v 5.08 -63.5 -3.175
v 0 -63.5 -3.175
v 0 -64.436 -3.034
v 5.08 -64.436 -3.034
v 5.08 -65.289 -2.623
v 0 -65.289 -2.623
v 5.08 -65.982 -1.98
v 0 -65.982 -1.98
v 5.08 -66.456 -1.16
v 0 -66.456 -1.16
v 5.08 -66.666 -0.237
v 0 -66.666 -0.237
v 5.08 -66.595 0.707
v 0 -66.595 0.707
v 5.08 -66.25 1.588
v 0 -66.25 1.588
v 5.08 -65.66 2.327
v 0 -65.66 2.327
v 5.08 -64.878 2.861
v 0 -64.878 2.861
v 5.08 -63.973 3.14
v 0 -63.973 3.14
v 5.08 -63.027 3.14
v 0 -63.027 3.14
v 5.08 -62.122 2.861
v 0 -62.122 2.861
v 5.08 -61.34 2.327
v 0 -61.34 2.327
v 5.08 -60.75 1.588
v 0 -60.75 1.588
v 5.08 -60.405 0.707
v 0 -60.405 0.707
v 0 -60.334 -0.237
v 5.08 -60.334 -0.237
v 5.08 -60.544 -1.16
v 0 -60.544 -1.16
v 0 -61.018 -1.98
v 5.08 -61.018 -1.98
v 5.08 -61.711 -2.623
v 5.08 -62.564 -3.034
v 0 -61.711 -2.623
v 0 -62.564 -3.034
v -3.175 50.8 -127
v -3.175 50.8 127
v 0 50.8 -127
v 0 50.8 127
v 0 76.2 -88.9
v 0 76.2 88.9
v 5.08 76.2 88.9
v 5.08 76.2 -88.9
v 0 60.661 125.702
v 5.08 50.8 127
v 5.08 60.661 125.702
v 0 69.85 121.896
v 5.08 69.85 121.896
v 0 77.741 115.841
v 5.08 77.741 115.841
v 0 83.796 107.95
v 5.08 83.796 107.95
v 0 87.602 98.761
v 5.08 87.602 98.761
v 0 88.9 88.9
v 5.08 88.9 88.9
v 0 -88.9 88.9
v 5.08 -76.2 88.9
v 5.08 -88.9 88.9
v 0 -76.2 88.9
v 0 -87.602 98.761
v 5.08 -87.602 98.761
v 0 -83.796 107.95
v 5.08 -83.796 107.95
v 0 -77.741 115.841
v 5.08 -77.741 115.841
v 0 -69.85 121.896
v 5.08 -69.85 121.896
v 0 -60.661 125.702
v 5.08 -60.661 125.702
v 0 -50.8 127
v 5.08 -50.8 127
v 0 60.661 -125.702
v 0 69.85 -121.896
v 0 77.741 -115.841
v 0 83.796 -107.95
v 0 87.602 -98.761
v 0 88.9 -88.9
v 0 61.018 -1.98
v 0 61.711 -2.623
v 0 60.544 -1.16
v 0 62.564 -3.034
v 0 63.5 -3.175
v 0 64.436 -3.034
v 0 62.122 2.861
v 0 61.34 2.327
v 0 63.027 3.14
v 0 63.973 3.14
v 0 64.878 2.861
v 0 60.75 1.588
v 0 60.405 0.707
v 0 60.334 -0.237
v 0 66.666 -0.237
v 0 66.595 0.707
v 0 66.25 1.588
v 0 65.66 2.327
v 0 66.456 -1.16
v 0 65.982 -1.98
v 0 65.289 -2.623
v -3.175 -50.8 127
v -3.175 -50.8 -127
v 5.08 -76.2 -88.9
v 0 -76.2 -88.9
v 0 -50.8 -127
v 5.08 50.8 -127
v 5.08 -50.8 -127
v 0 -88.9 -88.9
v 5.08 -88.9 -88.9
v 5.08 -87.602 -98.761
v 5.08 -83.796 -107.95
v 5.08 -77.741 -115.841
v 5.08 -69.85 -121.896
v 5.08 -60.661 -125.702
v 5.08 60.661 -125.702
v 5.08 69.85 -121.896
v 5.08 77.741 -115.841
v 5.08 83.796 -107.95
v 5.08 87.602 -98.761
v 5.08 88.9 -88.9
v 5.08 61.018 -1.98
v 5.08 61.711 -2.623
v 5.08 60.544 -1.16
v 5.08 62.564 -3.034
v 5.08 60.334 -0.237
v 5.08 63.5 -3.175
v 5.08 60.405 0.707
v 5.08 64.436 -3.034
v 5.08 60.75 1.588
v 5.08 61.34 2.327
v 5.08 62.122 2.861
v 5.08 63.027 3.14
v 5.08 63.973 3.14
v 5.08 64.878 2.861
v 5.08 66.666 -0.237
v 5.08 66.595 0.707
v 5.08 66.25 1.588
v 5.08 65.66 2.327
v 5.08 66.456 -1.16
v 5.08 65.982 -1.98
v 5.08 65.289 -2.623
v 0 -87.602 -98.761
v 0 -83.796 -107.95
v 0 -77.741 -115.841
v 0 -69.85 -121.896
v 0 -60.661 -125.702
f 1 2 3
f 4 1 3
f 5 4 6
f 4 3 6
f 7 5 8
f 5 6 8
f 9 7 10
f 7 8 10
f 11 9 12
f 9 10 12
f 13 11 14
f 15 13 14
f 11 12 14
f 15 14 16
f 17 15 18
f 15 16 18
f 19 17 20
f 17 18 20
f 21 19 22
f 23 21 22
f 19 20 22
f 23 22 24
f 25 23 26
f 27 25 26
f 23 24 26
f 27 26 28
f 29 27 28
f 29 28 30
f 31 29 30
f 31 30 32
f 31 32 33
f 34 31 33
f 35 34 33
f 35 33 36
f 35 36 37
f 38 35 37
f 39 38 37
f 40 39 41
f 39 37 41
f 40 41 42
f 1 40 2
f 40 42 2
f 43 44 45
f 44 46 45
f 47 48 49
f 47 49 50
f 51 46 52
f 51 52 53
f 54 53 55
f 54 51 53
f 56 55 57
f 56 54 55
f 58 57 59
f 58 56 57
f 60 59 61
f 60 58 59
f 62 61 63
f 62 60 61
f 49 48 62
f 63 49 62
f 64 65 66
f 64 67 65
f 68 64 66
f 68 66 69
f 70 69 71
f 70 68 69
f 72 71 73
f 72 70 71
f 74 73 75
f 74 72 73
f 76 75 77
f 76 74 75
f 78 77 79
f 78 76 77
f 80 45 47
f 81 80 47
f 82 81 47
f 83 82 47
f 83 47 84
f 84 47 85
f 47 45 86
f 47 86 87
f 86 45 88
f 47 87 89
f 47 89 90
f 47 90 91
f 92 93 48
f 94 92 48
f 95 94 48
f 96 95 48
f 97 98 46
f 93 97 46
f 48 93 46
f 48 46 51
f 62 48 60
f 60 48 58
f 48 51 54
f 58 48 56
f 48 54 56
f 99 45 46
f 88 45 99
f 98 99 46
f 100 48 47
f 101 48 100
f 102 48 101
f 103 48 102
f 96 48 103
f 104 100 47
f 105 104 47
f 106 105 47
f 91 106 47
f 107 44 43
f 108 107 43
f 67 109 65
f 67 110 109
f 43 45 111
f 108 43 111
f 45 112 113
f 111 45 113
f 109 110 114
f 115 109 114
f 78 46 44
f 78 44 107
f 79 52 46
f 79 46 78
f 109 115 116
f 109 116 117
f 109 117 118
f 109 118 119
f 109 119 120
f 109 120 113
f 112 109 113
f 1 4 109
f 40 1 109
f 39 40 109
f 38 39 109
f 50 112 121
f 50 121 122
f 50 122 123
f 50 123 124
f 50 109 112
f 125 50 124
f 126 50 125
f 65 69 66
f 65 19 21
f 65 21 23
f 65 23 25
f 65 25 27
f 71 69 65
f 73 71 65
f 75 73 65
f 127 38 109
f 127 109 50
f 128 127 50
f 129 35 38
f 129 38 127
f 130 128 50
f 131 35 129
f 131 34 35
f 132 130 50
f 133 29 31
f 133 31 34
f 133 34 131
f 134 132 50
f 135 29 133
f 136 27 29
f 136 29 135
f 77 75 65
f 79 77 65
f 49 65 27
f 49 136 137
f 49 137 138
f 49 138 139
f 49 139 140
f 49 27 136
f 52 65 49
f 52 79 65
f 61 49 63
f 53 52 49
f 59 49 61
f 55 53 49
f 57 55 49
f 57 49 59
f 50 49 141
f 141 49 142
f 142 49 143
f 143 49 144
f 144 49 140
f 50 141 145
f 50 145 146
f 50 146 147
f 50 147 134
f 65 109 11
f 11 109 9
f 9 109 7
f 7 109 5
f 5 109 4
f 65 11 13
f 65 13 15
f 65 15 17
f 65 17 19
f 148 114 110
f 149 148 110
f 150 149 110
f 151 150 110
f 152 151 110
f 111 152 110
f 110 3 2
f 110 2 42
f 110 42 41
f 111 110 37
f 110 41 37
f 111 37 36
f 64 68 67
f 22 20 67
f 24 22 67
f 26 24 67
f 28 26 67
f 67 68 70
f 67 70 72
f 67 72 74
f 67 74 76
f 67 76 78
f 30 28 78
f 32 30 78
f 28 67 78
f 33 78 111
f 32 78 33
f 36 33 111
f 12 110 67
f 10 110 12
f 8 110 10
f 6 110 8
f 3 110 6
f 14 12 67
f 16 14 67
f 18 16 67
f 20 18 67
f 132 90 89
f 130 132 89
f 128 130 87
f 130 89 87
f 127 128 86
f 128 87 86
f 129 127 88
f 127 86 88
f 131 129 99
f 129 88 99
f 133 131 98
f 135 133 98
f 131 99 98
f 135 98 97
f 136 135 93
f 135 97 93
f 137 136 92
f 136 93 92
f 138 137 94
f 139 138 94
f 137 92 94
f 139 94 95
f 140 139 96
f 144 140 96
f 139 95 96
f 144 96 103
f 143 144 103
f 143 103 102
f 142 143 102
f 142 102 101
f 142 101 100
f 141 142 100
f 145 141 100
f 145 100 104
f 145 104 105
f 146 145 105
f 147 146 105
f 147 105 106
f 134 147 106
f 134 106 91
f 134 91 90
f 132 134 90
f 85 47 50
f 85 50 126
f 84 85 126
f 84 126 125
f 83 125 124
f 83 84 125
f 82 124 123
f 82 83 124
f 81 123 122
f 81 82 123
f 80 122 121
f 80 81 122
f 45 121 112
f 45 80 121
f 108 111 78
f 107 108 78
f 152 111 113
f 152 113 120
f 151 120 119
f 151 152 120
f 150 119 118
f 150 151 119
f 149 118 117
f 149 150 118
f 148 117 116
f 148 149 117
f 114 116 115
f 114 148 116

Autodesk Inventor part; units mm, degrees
ref_plane "YZ Plane" through (0, 0, 0) normal (1, 0, 0) x (0, 1, 0)
ref_plane "XZ Plane" through (0, 0, 0) normal (0, 1, 0) x (-1, 0, 0)
ref_plane "XY Plane" through (0, 0, 0) normal (0, 0, 1) x (1, 0, 0)
sketch "Sketch1" plane through (0, 0, 0) normal (1, 0, 0) x (0, 1, 0)
  line L0 (-76.2, 88.9) -> (-76.2, 88.9)
  line L1 (-50.8, 127) -> (50.8, 127)
  line L2 (50.8, -127) -> (-50.8, -127)
  line L3 (-76.2, -88.9) -> (-76.2, 88.9)
  arc A0 (88.9, 88.9) -> (50.8, 127) centre (50.8, 88.9) ccw
  line L4 (76.2, 88.9) -> (88.9, 88.9)
  arc A1 (-50.8, 127) -> (-88.9, 88.9) centre (-50.8, 88.9) ccw
  line L5 (-50.8, 88.9) -> (-88.9, 88.9)
  arc A2 (50.8, -127) -> (88.9, -88.9) centre (50.8, -88.9) ccw
  line L6 (76.2, -88.9) -> (88.9, -88.9)
  line L7 (76.2, 88.9) -> (76.2, -88.9)
  arc A3 (-88.9, -88.9) -> (-50.8, -127) centre (-50.8, -88.9) ccw
  line L8 (-76.2, -88.9) -> (-88.9, -88.9)
  point P0 (0, 0)
  point P1 (-76.2, 117.2981)
  point P2 (-76.2, -117.2981)
  dimension "d62" = 254
  dimension "d64" = 76.2
  dimension "d65" = 127
  dimension "d66" = 76.2
  dimension "d72" = 76.2
  dimension "d73" = 25.4
  dimension "d74" = 76.2
  dimension "d76" = 25.4
  dimension "d77" = 76.2
  dimension "d78" = 25.4
extrude "Extrusion1" add sketch "Sketch1" along normal blind 5.08
sketch "Sketch3" plane through (5.08, 0, 0) normal (1, 0, 0) x (0, 0, -1)
  line L0 (88.9, 76.2) -> (-88.9, 76.2) projected
  line L1 (127, -50.8) -> (127, 50.8) projected
  line L2 (-88.9, -76.2) -> (88.9, -76.2) projected
  point P0 (0, 0)
  point P1 (0, -63.5)
  point P2 (0, 63.5)
  point P3 (0, 63.5)
  point P4 (127, 76.2)
  point P5 (127, -76.2)
  point P6 (-127, -76.2)
  dimension "d68" = 12.7
  dimension "d69" = 127
  dimension "d70" = 127
  dimension "d71" = 12.7
hole "Hole2" at (5.08, -63.5, 0) direction (-1, 0, 0) diameter 6.35 end through all
hole "Hole3" at (5.08, 63.5, 0) direction (-1, 0, 0) diameter 6.35 end through all
sketch "Sketch4" plane through (5.08, 0, 0) normal (1, 0, 0) x (0, 0, -1)
  line L0 (-127, 50.8) -> (-127, -50.8) projected
  line L1 (-127, 50.8) -> (127, 50.8)
  line L2 (127, 50.8) -> (127, -50.8)
  line L3 (127, -50.8) -> (-127, -50.8)
  line L4 (-127, -50.8) -> (-127, 50.8)
  point P0 (0, 0)
  point P1 (-88.9, 88.9)
  dimension "d79" = 101.6
  dimension "d80" = 38.1
extrude "Extrusion2" add sketch "Sketch4" against normal blind 8.255
properties part number "Frame 2.0" material "ABS Plastic"
